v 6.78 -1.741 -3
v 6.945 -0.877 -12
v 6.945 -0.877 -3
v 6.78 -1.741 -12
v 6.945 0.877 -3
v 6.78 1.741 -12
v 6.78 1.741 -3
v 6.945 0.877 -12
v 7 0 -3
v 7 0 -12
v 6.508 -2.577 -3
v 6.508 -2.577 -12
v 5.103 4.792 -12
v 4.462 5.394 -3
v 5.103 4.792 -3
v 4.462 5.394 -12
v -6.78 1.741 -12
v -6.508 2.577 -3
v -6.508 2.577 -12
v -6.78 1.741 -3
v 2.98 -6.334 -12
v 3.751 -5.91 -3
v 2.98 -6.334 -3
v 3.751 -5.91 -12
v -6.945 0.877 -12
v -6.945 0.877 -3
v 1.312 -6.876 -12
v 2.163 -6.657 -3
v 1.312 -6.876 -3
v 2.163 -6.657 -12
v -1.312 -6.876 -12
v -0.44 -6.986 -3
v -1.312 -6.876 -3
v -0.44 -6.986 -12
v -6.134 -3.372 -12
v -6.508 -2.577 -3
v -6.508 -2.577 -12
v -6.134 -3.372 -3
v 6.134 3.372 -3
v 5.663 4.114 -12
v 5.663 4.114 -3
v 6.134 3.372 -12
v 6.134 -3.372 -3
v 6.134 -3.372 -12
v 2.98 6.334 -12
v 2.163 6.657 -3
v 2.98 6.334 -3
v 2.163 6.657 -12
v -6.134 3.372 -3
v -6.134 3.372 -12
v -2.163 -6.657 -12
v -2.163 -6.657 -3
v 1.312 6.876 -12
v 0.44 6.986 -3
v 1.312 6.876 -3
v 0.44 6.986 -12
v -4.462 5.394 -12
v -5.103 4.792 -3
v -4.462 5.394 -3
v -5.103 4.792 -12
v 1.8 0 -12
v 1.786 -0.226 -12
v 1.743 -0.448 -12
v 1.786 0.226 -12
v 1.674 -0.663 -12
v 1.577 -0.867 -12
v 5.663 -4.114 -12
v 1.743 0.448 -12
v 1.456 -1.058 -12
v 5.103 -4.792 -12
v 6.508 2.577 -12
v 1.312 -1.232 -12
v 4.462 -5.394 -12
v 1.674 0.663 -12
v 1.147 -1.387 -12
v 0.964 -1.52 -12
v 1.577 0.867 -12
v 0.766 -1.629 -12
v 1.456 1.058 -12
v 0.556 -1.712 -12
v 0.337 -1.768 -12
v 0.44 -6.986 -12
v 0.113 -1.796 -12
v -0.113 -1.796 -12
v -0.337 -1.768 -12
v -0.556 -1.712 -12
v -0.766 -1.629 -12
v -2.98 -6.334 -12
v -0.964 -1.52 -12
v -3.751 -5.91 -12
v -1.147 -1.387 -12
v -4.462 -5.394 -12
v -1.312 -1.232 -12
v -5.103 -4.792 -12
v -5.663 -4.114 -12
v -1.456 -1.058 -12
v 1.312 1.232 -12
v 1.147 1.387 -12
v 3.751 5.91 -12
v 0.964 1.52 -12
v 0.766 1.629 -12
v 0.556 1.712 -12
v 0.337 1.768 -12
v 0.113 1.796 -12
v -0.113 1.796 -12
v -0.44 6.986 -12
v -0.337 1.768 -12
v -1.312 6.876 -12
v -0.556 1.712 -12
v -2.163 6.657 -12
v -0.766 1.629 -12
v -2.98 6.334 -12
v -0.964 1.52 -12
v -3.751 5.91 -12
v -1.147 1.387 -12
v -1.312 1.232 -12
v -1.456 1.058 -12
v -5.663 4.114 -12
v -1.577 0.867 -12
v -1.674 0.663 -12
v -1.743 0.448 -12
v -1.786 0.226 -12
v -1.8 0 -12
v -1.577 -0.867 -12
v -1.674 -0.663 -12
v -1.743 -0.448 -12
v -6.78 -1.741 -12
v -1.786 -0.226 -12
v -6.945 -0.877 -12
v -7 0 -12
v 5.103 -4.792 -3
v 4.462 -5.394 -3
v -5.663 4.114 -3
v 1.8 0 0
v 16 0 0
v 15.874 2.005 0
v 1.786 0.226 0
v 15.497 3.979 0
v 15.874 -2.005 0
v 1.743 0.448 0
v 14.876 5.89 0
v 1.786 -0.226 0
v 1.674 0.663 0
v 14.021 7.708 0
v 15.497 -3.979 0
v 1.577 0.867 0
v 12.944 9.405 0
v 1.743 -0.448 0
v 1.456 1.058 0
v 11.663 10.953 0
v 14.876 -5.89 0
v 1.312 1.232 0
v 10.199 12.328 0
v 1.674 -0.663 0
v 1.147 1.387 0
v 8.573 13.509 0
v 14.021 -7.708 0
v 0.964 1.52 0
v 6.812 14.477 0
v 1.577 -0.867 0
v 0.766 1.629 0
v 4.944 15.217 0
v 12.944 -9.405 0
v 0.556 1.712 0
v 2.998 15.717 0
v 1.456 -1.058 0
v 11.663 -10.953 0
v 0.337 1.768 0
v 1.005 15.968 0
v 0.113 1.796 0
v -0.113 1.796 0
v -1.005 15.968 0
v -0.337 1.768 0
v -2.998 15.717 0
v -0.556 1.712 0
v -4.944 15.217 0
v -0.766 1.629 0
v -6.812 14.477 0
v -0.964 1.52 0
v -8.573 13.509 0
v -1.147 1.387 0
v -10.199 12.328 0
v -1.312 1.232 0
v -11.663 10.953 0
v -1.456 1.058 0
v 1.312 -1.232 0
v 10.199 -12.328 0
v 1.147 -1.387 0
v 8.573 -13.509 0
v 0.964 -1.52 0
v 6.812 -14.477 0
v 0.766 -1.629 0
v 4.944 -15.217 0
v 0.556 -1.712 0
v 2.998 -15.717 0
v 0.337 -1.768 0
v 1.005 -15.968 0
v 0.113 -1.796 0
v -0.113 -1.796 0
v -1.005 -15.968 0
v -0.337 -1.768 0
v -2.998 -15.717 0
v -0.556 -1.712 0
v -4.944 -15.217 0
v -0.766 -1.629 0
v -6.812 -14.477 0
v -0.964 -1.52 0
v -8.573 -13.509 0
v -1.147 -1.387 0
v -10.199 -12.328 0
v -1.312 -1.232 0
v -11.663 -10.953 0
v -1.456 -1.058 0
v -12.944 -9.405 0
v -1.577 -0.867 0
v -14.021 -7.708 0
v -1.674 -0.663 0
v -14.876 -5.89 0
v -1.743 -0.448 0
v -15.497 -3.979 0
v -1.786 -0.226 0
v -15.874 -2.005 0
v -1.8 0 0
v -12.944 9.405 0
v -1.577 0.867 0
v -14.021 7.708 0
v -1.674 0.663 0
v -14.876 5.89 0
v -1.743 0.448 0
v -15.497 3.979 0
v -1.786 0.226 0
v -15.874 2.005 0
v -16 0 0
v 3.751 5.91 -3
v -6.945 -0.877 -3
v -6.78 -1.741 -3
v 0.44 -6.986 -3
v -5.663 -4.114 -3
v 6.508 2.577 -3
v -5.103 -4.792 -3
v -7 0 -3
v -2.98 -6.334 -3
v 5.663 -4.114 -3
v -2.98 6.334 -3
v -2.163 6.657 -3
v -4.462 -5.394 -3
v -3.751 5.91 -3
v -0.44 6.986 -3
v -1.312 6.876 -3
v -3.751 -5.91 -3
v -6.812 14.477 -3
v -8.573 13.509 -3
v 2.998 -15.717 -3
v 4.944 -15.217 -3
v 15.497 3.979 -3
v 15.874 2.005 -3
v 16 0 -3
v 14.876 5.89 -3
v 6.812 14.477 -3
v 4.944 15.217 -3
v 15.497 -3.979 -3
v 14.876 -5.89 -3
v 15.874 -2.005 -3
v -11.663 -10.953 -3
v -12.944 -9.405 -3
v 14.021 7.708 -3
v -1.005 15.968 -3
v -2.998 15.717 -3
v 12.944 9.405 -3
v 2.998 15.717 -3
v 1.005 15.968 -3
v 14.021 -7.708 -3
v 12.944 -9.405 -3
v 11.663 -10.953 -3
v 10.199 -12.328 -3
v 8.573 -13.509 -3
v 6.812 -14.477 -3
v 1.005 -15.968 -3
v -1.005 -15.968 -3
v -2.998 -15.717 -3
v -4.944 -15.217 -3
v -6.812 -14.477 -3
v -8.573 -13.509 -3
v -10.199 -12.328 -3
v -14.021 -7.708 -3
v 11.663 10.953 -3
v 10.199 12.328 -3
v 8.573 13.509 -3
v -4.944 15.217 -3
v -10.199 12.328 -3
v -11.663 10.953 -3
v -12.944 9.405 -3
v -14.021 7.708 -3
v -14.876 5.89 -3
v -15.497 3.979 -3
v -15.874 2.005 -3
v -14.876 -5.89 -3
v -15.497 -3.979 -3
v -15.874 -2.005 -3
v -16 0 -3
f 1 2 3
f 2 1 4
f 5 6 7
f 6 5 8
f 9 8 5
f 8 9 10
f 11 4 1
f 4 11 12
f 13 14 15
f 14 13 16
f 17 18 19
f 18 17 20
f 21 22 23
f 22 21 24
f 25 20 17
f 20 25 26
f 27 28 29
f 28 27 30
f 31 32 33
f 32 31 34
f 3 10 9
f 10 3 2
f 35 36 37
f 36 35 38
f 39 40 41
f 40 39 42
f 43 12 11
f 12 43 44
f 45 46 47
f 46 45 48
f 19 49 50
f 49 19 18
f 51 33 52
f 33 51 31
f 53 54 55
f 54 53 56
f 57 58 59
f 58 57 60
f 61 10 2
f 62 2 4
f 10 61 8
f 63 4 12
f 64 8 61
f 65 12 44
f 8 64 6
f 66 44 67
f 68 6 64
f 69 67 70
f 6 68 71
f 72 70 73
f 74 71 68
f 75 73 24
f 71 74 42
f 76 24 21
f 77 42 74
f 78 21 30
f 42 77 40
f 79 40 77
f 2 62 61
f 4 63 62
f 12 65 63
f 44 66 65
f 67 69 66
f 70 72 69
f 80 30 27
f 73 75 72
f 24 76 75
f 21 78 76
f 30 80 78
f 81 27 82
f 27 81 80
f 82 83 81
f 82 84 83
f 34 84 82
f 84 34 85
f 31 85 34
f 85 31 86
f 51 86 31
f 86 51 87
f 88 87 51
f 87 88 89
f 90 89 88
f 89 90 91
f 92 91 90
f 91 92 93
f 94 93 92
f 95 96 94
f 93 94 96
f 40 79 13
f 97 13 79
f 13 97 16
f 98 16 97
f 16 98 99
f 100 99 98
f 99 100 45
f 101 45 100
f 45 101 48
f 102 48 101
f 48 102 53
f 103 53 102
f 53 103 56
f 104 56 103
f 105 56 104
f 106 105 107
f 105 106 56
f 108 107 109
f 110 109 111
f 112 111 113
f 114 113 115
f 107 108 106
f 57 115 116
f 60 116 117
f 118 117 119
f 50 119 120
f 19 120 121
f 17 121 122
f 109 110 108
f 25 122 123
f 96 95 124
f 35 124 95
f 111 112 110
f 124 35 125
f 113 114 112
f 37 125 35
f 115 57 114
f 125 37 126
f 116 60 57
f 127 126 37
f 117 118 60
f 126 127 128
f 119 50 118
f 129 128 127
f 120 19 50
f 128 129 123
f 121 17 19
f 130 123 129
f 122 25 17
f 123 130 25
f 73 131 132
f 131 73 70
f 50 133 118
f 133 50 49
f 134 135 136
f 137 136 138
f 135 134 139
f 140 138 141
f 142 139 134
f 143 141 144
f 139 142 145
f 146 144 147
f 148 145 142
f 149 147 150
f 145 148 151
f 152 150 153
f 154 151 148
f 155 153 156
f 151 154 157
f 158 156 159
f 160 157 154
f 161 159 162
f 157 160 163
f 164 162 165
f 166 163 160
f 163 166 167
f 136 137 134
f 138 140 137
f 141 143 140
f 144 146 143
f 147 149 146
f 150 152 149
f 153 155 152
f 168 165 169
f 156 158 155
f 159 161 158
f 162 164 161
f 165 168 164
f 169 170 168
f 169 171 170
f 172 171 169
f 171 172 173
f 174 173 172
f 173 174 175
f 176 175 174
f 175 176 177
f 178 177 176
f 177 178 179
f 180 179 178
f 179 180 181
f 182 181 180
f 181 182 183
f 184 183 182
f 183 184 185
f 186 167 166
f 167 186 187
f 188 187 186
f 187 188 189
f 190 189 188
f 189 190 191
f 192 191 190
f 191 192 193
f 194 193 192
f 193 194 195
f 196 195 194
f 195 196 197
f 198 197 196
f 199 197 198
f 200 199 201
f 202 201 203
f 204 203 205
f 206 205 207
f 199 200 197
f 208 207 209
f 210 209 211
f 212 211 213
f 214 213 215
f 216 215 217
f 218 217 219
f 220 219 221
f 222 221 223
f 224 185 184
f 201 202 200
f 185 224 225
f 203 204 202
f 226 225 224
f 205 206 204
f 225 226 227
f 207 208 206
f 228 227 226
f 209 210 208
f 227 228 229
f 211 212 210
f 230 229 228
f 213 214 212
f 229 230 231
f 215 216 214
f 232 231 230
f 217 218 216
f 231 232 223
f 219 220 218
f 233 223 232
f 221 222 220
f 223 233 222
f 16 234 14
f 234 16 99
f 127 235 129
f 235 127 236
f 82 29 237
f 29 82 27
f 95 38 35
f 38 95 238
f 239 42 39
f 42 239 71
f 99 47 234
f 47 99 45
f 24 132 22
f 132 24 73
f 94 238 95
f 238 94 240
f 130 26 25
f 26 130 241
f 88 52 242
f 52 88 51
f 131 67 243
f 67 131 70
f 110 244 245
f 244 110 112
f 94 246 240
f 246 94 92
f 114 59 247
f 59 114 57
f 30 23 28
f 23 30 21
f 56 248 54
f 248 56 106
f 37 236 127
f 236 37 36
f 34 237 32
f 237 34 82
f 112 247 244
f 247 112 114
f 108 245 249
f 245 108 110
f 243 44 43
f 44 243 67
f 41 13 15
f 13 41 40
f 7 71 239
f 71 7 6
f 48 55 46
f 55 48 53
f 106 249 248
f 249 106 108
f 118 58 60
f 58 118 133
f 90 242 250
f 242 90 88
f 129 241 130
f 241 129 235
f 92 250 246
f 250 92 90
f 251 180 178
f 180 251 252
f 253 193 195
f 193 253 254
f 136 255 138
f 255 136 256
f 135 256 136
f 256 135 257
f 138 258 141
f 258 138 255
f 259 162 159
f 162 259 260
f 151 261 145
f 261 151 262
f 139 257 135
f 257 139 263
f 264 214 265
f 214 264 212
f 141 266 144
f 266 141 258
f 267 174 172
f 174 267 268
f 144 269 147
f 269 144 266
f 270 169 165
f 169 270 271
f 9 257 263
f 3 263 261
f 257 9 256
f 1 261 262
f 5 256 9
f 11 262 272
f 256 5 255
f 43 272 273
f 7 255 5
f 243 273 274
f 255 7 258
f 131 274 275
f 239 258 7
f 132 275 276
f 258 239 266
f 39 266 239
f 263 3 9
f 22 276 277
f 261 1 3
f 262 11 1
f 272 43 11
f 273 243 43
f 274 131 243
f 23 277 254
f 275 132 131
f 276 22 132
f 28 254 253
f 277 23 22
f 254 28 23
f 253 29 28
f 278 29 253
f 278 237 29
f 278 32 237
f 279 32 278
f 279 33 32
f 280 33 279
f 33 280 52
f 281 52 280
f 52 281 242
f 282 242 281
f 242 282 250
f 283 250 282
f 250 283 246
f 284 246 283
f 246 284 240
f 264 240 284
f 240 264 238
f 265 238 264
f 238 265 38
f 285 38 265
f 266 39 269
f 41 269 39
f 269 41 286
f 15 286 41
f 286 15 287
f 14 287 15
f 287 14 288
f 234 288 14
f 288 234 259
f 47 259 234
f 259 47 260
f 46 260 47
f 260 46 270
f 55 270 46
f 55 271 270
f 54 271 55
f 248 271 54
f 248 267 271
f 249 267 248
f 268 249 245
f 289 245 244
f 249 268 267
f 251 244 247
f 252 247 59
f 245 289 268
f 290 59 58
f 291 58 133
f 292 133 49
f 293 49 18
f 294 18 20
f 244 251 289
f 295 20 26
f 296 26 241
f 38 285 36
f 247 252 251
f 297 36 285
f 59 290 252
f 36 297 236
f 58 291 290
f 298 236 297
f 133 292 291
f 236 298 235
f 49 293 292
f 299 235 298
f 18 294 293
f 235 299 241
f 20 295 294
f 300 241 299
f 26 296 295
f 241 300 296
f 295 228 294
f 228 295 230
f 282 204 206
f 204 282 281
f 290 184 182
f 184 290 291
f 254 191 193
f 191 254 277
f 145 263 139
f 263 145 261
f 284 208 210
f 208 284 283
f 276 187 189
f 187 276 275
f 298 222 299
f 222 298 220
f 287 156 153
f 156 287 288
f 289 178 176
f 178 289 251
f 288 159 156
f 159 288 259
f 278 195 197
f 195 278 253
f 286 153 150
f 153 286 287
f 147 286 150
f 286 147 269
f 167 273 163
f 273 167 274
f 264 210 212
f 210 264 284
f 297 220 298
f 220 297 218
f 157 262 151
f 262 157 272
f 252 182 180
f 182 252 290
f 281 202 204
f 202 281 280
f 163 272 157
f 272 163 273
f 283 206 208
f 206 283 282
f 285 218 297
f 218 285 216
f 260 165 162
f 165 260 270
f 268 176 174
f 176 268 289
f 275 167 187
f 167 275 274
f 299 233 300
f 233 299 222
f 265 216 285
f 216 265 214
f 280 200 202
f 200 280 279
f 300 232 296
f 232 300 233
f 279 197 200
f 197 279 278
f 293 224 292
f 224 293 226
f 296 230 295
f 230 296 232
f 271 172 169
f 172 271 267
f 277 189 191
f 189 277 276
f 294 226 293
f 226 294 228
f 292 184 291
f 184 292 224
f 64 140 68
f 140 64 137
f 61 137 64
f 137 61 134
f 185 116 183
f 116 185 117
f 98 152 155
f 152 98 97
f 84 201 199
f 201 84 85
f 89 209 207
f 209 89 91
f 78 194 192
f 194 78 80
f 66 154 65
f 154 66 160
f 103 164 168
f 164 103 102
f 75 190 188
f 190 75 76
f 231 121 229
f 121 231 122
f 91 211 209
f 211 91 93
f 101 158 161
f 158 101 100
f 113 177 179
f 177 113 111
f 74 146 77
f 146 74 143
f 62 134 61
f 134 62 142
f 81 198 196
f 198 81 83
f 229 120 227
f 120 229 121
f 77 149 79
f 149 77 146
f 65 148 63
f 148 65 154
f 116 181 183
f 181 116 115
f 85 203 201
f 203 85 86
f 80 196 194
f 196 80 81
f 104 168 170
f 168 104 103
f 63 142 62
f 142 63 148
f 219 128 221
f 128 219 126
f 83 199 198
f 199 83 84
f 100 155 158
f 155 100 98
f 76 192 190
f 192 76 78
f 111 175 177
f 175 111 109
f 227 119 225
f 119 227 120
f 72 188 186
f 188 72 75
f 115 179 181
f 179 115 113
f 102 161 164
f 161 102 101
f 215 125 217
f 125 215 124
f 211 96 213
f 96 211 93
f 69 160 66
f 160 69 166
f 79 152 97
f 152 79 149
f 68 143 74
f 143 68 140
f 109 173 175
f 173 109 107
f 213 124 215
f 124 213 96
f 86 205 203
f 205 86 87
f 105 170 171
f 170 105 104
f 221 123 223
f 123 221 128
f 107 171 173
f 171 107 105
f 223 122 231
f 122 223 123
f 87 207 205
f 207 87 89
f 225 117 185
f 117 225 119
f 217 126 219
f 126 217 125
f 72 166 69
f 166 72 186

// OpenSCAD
$fn = 50;


difference() {
	union() {
		translate(v = [0, 0, -12.0000000000]) {
			cylinder(h = 12, r = 7.0000000000);
		}
		translate(v = [0, 0, -3.0000000000]) {
			cylinder(h = 3, r = 16.0000000000);
		}
	}
	union() {
		#translate(v = [0, 0, -12]) {
			cylinder(h = 12, r = 1.8000000000);
		}
	}
}
